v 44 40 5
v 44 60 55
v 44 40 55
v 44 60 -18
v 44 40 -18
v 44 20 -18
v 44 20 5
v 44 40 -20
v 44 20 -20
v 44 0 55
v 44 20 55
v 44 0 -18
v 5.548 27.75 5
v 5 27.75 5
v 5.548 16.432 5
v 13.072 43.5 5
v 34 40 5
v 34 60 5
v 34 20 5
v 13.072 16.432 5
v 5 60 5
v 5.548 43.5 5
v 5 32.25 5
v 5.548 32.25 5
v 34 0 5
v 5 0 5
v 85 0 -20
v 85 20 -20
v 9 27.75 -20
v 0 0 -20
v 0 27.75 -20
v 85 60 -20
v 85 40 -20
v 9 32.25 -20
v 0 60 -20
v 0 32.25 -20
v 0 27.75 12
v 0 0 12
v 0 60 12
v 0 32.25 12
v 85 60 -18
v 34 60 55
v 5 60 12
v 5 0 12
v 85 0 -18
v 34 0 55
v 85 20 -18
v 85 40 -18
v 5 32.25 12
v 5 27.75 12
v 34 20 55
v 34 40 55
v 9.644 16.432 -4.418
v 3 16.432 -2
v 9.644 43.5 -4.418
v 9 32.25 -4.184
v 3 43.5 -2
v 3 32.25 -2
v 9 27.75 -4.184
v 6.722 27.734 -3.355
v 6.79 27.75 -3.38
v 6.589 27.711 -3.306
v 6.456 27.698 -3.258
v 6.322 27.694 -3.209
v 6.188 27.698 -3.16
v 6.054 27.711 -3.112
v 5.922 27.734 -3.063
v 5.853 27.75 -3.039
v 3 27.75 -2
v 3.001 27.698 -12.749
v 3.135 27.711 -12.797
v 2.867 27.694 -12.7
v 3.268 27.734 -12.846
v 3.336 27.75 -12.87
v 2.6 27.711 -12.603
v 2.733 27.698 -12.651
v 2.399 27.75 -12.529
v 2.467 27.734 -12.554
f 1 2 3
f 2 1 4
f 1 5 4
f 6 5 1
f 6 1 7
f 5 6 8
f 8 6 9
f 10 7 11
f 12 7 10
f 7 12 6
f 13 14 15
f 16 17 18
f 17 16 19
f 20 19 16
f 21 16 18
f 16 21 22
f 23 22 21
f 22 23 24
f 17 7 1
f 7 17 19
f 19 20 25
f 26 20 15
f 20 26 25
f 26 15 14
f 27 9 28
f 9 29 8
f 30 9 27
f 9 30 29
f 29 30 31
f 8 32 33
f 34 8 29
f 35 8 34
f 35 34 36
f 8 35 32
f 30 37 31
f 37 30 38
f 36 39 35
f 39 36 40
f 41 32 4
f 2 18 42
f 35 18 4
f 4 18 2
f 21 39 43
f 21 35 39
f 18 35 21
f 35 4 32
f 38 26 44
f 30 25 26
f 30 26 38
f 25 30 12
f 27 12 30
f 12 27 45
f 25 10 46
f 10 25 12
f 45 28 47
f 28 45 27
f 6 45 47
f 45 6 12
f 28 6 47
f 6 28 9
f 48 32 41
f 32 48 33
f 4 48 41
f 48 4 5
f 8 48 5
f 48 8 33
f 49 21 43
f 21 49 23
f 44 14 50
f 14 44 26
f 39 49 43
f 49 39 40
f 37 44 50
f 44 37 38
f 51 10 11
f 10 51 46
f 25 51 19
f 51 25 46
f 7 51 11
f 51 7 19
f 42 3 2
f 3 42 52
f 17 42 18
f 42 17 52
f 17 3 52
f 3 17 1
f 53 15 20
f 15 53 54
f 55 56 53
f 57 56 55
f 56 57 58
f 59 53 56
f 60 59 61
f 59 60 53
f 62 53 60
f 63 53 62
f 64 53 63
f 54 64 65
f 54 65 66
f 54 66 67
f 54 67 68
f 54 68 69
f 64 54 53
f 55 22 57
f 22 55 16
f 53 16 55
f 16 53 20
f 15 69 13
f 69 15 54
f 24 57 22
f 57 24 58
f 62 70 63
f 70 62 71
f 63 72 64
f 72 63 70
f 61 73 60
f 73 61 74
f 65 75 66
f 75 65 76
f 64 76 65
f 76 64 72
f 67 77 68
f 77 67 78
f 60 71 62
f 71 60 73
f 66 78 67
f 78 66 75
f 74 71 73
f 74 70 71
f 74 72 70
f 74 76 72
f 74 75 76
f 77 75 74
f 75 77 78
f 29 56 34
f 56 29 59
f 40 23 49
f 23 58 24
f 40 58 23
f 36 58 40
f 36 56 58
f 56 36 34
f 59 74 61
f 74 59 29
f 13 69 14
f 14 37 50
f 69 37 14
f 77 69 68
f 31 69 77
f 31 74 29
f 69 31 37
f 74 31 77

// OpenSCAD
// Stecker: 26.8 x 7.0 x 10.7 mm
// Knickschutz: ∅ 4.5mm
// Kabel: ∅ 3.3mm

// Tablet: 280mm x 10mm x 180mm

// rough estimation, used for positioning tests
module tablet() {
	cube([280,12, 180]);
}

// not-so-rough estimation, used for positioning tests
module cable() {
	translate([2, 2, 10.7]) cube([22.8,3,5]);
	cube([26.8, 7, 10.7]);
	translate([26.8/2, 7/2, -10]) cylinder(r1=2.25, r2=2.25, h=10.1, $fn=100);
}

//translate([5,50 + 7/2,9]) rotate([-20, 0, -90]) tablet();

module stand() {
	difference() {
		union() {
			translate([0,0,-20]) cube([44,60,25]);
			translate([0,0,-20]) cube([85,20,2]);
			translate([0,40,-20]) cube([85,20,2]);
			cube([5,60,12]);
			translate([29+5,0,0]) cube([10,20,50+5]);
			translate([29+5,40,0]) cube([10,20,50+5]);
		}
		translate([3,40 + 7/2,-2]) rotate([-20, 0, -90]) scale([1.01, 1.01, 1.01]) cable();
		translate([4,30, -21]) cube([10,4.5,80], center = true);
	}
}

stand();

//rotate([90,0,0])
//union(){
//cube([75,20,5]);
//cube([5,20,10]);
//translate([29+5,0,0]) cube([10,20,50+5]);
//}
